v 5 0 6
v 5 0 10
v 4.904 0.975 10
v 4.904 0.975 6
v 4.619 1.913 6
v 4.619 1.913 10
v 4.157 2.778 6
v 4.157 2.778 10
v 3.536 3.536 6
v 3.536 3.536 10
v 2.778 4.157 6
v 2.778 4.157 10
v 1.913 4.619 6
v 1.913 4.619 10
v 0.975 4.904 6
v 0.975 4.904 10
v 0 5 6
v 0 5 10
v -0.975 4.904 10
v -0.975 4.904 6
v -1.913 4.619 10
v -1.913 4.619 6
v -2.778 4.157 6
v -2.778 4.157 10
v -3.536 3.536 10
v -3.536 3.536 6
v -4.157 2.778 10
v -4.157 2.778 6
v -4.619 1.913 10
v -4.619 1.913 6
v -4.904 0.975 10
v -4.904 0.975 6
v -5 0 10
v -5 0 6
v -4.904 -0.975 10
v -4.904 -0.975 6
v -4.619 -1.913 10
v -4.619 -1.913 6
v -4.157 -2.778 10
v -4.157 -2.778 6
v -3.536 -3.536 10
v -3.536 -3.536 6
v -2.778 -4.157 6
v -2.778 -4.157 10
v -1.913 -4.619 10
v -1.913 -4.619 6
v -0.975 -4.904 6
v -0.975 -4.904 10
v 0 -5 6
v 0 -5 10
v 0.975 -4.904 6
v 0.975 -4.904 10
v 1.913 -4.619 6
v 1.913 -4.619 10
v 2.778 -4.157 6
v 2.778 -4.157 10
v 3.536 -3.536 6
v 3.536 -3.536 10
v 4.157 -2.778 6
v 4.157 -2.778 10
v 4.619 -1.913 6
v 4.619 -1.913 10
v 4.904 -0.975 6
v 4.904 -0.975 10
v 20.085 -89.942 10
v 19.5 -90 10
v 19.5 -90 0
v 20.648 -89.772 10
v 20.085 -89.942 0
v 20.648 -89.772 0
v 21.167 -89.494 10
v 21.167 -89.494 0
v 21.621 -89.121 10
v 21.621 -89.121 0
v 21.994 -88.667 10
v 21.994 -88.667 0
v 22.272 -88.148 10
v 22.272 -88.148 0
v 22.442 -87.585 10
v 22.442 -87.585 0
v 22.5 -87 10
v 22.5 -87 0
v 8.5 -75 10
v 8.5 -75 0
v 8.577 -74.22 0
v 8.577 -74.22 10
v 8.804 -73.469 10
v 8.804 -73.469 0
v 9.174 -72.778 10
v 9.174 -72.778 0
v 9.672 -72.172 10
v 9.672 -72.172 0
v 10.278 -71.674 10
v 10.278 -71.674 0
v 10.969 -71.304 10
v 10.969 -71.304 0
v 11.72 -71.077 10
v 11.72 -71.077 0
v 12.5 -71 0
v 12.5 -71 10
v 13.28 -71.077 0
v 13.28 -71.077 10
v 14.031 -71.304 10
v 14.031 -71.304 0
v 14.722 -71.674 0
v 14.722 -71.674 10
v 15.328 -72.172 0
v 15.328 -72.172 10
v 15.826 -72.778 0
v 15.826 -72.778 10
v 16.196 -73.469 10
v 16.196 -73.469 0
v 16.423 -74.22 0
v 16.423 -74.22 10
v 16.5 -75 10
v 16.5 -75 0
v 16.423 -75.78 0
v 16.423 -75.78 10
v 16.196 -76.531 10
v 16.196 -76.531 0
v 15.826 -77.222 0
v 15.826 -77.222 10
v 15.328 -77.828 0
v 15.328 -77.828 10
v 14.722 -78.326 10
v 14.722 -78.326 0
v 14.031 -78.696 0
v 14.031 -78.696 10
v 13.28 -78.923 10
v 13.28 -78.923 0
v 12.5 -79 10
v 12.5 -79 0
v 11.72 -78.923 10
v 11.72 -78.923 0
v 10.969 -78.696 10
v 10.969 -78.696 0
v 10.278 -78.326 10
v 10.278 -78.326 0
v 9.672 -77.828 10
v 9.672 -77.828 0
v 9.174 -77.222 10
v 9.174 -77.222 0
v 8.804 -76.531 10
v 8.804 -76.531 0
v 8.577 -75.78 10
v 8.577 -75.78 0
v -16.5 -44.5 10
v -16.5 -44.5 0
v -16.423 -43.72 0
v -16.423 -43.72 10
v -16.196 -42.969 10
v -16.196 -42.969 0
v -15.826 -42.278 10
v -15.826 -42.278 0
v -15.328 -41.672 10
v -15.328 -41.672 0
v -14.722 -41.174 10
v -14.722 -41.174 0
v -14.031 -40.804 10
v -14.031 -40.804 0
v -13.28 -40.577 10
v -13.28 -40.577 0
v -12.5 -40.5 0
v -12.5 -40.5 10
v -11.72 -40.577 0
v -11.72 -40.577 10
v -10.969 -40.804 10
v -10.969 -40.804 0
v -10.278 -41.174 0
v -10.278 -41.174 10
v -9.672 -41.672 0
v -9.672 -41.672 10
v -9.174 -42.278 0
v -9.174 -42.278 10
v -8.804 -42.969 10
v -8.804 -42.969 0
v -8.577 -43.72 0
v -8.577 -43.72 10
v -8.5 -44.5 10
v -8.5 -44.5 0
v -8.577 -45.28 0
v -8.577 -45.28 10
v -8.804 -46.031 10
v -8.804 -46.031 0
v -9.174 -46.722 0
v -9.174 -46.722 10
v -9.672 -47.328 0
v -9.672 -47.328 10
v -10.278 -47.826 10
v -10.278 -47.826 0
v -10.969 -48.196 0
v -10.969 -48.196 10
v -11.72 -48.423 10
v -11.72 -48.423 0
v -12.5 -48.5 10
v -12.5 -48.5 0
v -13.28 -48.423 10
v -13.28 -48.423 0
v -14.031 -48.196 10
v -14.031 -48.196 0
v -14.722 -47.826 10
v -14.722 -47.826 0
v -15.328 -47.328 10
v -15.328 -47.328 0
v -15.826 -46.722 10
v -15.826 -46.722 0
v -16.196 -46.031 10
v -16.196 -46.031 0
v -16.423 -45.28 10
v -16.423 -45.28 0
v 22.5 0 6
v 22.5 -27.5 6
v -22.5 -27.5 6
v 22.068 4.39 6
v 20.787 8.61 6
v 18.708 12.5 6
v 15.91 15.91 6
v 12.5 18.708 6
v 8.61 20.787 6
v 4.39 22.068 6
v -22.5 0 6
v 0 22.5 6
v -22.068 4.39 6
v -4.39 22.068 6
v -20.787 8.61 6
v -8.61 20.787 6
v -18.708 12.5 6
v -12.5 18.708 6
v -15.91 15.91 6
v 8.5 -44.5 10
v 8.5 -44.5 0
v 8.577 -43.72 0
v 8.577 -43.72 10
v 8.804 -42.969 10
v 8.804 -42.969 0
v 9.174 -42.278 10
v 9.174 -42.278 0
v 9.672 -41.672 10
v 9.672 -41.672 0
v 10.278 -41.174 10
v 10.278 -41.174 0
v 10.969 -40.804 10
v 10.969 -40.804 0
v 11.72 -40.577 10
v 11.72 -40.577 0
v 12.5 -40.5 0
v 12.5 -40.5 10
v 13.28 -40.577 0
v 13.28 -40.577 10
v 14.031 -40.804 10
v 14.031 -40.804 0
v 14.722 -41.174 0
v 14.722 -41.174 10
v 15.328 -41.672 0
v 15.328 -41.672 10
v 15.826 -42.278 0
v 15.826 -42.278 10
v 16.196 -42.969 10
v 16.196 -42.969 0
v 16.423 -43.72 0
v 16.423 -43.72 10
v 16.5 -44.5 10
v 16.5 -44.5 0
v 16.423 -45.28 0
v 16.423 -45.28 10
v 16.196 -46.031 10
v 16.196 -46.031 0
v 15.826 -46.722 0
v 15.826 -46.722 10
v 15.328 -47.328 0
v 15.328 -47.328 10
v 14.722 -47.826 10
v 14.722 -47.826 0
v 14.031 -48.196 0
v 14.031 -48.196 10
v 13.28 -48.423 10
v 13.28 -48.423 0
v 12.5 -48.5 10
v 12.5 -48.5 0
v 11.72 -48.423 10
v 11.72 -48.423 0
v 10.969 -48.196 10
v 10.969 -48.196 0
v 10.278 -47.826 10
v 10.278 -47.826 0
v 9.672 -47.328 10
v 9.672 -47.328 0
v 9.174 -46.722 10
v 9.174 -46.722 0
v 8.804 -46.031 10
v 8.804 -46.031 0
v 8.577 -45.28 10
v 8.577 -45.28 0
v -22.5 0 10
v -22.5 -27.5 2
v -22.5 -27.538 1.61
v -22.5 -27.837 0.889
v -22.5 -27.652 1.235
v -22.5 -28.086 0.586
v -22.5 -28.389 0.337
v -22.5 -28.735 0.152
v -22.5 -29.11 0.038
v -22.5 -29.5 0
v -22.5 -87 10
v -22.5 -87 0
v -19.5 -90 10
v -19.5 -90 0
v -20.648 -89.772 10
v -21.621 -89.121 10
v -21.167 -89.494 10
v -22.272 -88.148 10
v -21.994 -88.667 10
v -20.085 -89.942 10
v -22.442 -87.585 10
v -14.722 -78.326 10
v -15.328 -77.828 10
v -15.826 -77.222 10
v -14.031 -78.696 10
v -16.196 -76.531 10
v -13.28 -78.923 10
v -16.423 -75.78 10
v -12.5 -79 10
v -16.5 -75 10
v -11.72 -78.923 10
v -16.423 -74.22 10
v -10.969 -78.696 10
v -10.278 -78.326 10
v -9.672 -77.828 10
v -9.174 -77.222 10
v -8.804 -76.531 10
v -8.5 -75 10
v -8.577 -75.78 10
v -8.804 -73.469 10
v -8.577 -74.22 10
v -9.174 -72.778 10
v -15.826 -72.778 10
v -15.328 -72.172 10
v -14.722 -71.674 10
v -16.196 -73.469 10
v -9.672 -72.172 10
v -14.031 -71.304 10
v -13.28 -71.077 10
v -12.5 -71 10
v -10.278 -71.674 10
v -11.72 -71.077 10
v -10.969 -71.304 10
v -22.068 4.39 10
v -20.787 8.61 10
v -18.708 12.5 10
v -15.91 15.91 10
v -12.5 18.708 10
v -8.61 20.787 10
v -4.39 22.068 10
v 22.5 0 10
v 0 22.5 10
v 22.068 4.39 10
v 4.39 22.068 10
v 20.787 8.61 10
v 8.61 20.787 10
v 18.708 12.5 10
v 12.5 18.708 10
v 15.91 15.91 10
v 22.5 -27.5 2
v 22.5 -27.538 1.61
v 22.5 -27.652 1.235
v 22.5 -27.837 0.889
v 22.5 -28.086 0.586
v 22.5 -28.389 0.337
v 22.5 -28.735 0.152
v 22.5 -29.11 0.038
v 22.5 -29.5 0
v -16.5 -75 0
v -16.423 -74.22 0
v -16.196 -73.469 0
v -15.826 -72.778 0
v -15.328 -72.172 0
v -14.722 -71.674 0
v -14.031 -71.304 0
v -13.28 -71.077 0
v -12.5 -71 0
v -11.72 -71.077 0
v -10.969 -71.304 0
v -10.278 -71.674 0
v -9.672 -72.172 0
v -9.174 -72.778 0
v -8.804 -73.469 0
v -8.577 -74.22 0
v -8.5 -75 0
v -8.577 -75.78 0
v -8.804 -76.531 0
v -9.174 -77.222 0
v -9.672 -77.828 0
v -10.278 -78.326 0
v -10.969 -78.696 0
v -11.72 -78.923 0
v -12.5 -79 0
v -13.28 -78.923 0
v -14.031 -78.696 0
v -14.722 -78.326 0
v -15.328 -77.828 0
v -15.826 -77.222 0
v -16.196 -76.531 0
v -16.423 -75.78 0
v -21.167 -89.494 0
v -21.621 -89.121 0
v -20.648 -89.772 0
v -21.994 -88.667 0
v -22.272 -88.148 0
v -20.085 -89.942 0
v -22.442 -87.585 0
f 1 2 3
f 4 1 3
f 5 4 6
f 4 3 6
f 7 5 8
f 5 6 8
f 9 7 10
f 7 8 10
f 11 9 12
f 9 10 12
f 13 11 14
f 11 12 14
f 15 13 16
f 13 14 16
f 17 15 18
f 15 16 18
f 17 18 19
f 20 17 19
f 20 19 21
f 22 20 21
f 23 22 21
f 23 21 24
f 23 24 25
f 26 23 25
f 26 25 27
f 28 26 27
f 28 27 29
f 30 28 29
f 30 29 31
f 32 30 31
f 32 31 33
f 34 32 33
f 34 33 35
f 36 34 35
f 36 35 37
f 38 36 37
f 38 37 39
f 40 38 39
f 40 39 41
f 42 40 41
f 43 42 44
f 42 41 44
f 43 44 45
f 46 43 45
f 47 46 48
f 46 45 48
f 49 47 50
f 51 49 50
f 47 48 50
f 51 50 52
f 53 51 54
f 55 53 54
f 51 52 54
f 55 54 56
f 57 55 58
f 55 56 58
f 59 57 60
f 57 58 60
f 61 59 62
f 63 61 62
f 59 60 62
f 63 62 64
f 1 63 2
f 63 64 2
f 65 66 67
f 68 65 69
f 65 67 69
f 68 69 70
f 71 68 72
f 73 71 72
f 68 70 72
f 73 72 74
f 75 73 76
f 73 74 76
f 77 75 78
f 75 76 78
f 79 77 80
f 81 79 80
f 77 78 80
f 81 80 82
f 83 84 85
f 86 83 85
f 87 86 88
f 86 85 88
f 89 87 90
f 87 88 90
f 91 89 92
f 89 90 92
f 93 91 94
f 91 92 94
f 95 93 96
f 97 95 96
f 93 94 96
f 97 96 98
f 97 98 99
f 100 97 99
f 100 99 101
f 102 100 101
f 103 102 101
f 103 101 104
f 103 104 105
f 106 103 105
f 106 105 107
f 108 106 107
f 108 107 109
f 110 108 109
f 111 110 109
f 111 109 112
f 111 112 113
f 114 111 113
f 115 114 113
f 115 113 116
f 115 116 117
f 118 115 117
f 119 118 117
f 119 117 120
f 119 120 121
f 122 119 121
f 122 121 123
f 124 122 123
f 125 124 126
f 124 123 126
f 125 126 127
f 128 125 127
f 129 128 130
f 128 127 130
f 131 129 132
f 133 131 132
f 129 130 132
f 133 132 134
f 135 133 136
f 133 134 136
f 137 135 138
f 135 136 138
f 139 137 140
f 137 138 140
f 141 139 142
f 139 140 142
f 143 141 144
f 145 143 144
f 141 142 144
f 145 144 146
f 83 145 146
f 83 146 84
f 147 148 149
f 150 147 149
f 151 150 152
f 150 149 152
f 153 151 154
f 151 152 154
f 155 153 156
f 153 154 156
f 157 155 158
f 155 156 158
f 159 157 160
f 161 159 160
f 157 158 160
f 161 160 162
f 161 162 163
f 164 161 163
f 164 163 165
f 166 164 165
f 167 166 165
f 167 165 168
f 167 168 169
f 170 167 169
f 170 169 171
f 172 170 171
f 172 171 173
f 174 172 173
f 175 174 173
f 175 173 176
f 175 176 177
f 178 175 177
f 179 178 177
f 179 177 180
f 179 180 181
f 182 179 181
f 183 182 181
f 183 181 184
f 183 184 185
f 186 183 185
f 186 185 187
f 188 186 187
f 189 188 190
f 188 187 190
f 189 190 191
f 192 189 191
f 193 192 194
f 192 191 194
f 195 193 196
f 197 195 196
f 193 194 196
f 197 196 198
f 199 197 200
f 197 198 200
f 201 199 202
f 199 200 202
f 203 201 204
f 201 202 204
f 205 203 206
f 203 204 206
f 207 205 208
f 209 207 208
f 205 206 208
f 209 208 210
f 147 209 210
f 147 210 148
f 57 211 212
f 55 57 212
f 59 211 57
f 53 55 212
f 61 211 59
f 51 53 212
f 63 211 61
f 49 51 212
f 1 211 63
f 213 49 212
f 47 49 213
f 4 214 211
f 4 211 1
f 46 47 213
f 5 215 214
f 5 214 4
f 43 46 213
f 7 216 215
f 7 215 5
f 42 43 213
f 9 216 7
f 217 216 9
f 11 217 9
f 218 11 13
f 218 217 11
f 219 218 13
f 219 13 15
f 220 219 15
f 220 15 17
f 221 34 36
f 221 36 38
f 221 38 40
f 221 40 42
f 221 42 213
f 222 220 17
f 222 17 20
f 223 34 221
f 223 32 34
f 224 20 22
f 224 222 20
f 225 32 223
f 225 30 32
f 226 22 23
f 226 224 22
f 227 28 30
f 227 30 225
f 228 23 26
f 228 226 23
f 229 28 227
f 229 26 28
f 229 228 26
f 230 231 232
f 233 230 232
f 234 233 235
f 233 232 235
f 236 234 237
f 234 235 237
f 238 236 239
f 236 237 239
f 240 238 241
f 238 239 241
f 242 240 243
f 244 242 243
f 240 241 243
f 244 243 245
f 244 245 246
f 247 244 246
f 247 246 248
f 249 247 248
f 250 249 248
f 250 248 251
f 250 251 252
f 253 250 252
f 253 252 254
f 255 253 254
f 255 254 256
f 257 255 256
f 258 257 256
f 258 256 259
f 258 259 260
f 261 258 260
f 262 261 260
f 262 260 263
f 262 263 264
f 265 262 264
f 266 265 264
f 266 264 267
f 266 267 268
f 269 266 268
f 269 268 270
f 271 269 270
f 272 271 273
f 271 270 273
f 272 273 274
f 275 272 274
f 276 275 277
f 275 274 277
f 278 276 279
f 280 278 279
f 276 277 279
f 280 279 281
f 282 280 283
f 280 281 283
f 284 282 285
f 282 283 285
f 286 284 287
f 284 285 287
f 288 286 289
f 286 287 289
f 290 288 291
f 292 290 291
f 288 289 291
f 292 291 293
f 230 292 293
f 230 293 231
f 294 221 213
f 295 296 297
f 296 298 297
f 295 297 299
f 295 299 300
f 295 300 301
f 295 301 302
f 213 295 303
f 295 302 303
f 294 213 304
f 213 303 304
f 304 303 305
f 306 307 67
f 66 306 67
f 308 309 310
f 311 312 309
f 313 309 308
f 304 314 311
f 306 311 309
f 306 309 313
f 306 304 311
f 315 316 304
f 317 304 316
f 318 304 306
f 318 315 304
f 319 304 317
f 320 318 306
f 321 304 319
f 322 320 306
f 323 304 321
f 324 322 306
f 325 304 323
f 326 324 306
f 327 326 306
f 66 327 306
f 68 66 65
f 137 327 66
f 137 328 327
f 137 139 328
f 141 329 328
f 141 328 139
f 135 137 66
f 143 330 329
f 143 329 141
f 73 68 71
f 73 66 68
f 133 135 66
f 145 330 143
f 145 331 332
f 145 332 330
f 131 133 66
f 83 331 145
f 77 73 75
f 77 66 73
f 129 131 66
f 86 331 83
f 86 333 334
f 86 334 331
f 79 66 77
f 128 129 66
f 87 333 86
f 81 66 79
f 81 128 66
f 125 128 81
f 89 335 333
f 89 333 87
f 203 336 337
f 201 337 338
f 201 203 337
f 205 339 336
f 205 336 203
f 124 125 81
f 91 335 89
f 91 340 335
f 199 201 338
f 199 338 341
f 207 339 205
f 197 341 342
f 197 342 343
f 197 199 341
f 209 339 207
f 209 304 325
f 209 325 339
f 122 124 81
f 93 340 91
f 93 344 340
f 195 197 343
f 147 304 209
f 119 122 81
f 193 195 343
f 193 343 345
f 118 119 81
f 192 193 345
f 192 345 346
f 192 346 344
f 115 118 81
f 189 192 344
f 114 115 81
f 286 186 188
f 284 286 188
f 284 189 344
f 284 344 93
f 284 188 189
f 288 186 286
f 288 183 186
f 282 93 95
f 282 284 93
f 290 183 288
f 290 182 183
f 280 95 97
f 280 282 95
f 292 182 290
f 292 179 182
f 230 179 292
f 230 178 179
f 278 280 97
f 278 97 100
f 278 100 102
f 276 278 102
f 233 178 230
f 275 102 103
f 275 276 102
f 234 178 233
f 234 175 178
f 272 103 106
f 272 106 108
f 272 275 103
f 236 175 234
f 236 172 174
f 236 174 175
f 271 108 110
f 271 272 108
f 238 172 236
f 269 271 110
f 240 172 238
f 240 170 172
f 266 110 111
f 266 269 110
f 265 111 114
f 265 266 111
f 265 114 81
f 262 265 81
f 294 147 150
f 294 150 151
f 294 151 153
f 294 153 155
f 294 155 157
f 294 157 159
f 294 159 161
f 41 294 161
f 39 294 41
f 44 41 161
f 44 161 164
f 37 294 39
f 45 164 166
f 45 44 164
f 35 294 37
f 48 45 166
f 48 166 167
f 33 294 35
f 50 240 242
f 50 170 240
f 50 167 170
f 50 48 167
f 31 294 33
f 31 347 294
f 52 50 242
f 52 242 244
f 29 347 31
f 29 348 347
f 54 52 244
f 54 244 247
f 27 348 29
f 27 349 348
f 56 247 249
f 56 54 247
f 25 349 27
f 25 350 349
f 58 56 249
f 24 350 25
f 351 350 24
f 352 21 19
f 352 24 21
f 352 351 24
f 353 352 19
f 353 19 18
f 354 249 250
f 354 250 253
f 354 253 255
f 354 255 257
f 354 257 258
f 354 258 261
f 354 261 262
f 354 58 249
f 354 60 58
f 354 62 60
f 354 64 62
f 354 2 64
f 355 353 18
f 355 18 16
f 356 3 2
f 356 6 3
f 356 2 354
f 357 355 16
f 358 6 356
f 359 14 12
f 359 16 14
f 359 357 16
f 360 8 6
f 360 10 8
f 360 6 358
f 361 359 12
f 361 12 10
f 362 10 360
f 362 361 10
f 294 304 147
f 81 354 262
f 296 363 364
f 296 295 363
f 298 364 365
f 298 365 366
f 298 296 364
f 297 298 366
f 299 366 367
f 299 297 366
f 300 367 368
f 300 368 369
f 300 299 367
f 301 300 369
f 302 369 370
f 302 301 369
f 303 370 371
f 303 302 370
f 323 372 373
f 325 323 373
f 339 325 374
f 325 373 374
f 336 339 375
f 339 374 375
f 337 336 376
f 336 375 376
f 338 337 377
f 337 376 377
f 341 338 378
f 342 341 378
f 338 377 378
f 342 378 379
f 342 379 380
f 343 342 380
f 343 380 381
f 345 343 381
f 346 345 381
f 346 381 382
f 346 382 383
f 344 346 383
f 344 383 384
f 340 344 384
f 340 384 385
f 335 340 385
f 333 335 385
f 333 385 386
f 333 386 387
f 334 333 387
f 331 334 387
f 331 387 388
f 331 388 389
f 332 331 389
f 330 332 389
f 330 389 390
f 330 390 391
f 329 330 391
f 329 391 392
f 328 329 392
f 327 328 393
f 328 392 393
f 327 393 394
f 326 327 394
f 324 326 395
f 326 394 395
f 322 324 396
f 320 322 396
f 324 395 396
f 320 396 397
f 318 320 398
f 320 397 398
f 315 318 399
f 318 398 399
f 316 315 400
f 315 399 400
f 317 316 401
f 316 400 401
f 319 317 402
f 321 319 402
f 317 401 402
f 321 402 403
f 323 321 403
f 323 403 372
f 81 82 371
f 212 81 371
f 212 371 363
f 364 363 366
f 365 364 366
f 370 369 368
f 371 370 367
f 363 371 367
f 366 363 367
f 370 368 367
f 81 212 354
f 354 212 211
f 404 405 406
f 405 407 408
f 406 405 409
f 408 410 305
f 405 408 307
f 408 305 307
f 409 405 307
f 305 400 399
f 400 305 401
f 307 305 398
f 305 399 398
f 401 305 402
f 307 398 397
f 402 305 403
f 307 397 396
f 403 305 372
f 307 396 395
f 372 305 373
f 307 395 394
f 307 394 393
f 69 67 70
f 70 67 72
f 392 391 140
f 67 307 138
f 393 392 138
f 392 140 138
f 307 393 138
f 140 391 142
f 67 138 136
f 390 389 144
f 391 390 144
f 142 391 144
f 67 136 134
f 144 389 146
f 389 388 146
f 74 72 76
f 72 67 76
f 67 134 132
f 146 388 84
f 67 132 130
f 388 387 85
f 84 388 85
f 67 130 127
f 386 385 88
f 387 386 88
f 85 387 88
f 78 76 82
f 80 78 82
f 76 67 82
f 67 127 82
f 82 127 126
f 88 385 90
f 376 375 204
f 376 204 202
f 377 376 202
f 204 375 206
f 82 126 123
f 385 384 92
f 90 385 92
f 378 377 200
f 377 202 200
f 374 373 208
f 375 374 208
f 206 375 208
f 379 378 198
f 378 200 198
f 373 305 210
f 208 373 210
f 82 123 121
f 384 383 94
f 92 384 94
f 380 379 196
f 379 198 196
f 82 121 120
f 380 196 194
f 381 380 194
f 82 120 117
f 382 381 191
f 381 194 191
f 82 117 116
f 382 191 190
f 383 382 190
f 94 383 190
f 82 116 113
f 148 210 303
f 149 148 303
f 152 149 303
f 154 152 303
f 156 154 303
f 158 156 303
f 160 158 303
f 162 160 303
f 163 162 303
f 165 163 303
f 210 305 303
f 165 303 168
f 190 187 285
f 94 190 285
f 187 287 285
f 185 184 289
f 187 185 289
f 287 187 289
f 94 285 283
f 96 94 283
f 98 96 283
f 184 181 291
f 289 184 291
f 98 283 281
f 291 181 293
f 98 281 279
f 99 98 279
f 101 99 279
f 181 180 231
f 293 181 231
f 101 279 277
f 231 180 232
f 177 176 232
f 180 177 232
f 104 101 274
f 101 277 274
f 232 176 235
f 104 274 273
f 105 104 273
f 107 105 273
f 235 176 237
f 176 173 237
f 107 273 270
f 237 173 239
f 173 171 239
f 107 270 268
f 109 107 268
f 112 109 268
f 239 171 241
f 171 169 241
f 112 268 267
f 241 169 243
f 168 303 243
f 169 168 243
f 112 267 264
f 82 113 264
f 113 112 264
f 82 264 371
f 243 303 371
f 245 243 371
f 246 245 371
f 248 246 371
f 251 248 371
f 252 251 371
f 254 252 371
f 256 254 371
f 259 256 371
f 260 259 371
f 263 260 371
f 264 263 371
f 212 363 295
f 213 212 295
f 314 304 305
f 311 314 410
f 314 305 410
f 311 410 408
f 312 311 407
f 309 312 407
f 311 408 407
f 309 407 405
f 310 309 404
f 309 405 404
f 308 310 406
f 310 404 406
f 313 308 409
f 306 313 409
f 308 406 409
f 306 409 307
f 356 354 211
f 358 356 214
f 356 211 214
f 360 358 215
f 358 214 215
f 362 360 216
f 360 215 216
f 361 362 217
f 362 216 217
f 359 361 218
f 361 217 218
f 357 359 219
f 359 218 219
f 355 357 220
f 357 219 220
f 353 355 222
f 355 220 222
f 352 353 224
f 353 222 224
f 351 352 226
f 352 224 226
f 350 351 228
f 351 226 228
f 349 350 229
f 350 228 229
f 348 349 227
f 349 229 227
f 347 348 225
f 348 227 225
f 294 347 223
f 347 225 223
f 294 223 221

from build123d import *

# Parameters (mm, degrees)
EXTRUDE_1_DEPTH     = 10
CUT_EXTRUDE_1_DEPTH = 6
FILLET_1_R          = 2
SKETCH_3_R          = 5
CUT_EXTRUDE_2_DEPTH = 6
SKETCH_5_R          = 4
CUT_EXTRUDE_3_DEPTH = 94.307288033


with BuildPart() as part:
    # 草图1 → 凸台-拉伸1 (new body)
    with BuildSketch(Plane.XY):
        with BuildLine():
            Line((-22.5, 0), (-22.5, -87))
            ThreePointArc((-22.5, -87), (-21.621320344, -89.121320344), (-19.5, -90))
            Line((-19.5, -90), (19.5, -90))
            ThreePointArc((19.5, -90), (21.621320344, -89.121320344), (22.5, -87))
            Line((22.5, -87), (22.5, 0))
            ThreePointArc((22.5, 0), (0, 22.5), (-22.5, 0))
        make_face()
    extrude(amount=EXTRUDE_1_DEPTH)

    # 草图2 → 切除-拉伸1 (cut)
    with BuildSketch(Plane(origin=(0, 0, 0), x_dir=(-1, 0, 0), z_dir=(0, 0, -1))):
        with BuildLine():
            Line((-22.5, 0), (-22.5, -27.5))
            Line((-22.5, -27.5), (22.5, -27.5))
            Line((22.5, -27.5), (22.5, 0))
            ThreePointArc((22.5, 0), (15.909902614, 15.909902539), (1.06e-07, 22.5))
            ThreePointArc((1.06e-07, 22.5), (-15.909902539, 15.909902614), (-22.5, 0))
        make_face()
    extrude(amount=-CUT_EXTRUDE_1_DEPTH, mode=Mode.SUBTRACT)

    # 圆角1
    fillet_1_edges = [part.edges().sort_by_distance(p)[0] for p in [
        (0, -27.5, 0),
    ]]
    fillet(fillet_1_edges, radius=FILLET_1_R)

    # 草图3 → 切除-拉伸2 (cut)
    with BuildSketch(Plane.XY.offset(10)):
        Circle(SKETCH_3_R)
    extrude(amount=-CUT_EXTRUDE_2_DEPTH, mode=Mode.SUBTRACT)

    # 草图5 → 切除-拉伸3 (cut, through all)
    with BuildSketch(Plane(origin=(0, 0, 0), x_dir=(-1, 0, 0), z_dir=(0, 0, -1))):
        with Locations((-12.5, -44.5)):
            Circle(SKETCH_5_R)
        with Locations((12.5, -44.5)):
            Circle(SKETCH_5_R)
        with Locations((12.5, -75)):
            Circle(SKETCH_5_R)
        with Locations((-12.5, -75)):
            Circle(SKETCH_5_R)
    extrude(amount=-CUT_EXTRUDE_3_DEPTH, mode=Mode.SUBTRACT)


solid = part.part
